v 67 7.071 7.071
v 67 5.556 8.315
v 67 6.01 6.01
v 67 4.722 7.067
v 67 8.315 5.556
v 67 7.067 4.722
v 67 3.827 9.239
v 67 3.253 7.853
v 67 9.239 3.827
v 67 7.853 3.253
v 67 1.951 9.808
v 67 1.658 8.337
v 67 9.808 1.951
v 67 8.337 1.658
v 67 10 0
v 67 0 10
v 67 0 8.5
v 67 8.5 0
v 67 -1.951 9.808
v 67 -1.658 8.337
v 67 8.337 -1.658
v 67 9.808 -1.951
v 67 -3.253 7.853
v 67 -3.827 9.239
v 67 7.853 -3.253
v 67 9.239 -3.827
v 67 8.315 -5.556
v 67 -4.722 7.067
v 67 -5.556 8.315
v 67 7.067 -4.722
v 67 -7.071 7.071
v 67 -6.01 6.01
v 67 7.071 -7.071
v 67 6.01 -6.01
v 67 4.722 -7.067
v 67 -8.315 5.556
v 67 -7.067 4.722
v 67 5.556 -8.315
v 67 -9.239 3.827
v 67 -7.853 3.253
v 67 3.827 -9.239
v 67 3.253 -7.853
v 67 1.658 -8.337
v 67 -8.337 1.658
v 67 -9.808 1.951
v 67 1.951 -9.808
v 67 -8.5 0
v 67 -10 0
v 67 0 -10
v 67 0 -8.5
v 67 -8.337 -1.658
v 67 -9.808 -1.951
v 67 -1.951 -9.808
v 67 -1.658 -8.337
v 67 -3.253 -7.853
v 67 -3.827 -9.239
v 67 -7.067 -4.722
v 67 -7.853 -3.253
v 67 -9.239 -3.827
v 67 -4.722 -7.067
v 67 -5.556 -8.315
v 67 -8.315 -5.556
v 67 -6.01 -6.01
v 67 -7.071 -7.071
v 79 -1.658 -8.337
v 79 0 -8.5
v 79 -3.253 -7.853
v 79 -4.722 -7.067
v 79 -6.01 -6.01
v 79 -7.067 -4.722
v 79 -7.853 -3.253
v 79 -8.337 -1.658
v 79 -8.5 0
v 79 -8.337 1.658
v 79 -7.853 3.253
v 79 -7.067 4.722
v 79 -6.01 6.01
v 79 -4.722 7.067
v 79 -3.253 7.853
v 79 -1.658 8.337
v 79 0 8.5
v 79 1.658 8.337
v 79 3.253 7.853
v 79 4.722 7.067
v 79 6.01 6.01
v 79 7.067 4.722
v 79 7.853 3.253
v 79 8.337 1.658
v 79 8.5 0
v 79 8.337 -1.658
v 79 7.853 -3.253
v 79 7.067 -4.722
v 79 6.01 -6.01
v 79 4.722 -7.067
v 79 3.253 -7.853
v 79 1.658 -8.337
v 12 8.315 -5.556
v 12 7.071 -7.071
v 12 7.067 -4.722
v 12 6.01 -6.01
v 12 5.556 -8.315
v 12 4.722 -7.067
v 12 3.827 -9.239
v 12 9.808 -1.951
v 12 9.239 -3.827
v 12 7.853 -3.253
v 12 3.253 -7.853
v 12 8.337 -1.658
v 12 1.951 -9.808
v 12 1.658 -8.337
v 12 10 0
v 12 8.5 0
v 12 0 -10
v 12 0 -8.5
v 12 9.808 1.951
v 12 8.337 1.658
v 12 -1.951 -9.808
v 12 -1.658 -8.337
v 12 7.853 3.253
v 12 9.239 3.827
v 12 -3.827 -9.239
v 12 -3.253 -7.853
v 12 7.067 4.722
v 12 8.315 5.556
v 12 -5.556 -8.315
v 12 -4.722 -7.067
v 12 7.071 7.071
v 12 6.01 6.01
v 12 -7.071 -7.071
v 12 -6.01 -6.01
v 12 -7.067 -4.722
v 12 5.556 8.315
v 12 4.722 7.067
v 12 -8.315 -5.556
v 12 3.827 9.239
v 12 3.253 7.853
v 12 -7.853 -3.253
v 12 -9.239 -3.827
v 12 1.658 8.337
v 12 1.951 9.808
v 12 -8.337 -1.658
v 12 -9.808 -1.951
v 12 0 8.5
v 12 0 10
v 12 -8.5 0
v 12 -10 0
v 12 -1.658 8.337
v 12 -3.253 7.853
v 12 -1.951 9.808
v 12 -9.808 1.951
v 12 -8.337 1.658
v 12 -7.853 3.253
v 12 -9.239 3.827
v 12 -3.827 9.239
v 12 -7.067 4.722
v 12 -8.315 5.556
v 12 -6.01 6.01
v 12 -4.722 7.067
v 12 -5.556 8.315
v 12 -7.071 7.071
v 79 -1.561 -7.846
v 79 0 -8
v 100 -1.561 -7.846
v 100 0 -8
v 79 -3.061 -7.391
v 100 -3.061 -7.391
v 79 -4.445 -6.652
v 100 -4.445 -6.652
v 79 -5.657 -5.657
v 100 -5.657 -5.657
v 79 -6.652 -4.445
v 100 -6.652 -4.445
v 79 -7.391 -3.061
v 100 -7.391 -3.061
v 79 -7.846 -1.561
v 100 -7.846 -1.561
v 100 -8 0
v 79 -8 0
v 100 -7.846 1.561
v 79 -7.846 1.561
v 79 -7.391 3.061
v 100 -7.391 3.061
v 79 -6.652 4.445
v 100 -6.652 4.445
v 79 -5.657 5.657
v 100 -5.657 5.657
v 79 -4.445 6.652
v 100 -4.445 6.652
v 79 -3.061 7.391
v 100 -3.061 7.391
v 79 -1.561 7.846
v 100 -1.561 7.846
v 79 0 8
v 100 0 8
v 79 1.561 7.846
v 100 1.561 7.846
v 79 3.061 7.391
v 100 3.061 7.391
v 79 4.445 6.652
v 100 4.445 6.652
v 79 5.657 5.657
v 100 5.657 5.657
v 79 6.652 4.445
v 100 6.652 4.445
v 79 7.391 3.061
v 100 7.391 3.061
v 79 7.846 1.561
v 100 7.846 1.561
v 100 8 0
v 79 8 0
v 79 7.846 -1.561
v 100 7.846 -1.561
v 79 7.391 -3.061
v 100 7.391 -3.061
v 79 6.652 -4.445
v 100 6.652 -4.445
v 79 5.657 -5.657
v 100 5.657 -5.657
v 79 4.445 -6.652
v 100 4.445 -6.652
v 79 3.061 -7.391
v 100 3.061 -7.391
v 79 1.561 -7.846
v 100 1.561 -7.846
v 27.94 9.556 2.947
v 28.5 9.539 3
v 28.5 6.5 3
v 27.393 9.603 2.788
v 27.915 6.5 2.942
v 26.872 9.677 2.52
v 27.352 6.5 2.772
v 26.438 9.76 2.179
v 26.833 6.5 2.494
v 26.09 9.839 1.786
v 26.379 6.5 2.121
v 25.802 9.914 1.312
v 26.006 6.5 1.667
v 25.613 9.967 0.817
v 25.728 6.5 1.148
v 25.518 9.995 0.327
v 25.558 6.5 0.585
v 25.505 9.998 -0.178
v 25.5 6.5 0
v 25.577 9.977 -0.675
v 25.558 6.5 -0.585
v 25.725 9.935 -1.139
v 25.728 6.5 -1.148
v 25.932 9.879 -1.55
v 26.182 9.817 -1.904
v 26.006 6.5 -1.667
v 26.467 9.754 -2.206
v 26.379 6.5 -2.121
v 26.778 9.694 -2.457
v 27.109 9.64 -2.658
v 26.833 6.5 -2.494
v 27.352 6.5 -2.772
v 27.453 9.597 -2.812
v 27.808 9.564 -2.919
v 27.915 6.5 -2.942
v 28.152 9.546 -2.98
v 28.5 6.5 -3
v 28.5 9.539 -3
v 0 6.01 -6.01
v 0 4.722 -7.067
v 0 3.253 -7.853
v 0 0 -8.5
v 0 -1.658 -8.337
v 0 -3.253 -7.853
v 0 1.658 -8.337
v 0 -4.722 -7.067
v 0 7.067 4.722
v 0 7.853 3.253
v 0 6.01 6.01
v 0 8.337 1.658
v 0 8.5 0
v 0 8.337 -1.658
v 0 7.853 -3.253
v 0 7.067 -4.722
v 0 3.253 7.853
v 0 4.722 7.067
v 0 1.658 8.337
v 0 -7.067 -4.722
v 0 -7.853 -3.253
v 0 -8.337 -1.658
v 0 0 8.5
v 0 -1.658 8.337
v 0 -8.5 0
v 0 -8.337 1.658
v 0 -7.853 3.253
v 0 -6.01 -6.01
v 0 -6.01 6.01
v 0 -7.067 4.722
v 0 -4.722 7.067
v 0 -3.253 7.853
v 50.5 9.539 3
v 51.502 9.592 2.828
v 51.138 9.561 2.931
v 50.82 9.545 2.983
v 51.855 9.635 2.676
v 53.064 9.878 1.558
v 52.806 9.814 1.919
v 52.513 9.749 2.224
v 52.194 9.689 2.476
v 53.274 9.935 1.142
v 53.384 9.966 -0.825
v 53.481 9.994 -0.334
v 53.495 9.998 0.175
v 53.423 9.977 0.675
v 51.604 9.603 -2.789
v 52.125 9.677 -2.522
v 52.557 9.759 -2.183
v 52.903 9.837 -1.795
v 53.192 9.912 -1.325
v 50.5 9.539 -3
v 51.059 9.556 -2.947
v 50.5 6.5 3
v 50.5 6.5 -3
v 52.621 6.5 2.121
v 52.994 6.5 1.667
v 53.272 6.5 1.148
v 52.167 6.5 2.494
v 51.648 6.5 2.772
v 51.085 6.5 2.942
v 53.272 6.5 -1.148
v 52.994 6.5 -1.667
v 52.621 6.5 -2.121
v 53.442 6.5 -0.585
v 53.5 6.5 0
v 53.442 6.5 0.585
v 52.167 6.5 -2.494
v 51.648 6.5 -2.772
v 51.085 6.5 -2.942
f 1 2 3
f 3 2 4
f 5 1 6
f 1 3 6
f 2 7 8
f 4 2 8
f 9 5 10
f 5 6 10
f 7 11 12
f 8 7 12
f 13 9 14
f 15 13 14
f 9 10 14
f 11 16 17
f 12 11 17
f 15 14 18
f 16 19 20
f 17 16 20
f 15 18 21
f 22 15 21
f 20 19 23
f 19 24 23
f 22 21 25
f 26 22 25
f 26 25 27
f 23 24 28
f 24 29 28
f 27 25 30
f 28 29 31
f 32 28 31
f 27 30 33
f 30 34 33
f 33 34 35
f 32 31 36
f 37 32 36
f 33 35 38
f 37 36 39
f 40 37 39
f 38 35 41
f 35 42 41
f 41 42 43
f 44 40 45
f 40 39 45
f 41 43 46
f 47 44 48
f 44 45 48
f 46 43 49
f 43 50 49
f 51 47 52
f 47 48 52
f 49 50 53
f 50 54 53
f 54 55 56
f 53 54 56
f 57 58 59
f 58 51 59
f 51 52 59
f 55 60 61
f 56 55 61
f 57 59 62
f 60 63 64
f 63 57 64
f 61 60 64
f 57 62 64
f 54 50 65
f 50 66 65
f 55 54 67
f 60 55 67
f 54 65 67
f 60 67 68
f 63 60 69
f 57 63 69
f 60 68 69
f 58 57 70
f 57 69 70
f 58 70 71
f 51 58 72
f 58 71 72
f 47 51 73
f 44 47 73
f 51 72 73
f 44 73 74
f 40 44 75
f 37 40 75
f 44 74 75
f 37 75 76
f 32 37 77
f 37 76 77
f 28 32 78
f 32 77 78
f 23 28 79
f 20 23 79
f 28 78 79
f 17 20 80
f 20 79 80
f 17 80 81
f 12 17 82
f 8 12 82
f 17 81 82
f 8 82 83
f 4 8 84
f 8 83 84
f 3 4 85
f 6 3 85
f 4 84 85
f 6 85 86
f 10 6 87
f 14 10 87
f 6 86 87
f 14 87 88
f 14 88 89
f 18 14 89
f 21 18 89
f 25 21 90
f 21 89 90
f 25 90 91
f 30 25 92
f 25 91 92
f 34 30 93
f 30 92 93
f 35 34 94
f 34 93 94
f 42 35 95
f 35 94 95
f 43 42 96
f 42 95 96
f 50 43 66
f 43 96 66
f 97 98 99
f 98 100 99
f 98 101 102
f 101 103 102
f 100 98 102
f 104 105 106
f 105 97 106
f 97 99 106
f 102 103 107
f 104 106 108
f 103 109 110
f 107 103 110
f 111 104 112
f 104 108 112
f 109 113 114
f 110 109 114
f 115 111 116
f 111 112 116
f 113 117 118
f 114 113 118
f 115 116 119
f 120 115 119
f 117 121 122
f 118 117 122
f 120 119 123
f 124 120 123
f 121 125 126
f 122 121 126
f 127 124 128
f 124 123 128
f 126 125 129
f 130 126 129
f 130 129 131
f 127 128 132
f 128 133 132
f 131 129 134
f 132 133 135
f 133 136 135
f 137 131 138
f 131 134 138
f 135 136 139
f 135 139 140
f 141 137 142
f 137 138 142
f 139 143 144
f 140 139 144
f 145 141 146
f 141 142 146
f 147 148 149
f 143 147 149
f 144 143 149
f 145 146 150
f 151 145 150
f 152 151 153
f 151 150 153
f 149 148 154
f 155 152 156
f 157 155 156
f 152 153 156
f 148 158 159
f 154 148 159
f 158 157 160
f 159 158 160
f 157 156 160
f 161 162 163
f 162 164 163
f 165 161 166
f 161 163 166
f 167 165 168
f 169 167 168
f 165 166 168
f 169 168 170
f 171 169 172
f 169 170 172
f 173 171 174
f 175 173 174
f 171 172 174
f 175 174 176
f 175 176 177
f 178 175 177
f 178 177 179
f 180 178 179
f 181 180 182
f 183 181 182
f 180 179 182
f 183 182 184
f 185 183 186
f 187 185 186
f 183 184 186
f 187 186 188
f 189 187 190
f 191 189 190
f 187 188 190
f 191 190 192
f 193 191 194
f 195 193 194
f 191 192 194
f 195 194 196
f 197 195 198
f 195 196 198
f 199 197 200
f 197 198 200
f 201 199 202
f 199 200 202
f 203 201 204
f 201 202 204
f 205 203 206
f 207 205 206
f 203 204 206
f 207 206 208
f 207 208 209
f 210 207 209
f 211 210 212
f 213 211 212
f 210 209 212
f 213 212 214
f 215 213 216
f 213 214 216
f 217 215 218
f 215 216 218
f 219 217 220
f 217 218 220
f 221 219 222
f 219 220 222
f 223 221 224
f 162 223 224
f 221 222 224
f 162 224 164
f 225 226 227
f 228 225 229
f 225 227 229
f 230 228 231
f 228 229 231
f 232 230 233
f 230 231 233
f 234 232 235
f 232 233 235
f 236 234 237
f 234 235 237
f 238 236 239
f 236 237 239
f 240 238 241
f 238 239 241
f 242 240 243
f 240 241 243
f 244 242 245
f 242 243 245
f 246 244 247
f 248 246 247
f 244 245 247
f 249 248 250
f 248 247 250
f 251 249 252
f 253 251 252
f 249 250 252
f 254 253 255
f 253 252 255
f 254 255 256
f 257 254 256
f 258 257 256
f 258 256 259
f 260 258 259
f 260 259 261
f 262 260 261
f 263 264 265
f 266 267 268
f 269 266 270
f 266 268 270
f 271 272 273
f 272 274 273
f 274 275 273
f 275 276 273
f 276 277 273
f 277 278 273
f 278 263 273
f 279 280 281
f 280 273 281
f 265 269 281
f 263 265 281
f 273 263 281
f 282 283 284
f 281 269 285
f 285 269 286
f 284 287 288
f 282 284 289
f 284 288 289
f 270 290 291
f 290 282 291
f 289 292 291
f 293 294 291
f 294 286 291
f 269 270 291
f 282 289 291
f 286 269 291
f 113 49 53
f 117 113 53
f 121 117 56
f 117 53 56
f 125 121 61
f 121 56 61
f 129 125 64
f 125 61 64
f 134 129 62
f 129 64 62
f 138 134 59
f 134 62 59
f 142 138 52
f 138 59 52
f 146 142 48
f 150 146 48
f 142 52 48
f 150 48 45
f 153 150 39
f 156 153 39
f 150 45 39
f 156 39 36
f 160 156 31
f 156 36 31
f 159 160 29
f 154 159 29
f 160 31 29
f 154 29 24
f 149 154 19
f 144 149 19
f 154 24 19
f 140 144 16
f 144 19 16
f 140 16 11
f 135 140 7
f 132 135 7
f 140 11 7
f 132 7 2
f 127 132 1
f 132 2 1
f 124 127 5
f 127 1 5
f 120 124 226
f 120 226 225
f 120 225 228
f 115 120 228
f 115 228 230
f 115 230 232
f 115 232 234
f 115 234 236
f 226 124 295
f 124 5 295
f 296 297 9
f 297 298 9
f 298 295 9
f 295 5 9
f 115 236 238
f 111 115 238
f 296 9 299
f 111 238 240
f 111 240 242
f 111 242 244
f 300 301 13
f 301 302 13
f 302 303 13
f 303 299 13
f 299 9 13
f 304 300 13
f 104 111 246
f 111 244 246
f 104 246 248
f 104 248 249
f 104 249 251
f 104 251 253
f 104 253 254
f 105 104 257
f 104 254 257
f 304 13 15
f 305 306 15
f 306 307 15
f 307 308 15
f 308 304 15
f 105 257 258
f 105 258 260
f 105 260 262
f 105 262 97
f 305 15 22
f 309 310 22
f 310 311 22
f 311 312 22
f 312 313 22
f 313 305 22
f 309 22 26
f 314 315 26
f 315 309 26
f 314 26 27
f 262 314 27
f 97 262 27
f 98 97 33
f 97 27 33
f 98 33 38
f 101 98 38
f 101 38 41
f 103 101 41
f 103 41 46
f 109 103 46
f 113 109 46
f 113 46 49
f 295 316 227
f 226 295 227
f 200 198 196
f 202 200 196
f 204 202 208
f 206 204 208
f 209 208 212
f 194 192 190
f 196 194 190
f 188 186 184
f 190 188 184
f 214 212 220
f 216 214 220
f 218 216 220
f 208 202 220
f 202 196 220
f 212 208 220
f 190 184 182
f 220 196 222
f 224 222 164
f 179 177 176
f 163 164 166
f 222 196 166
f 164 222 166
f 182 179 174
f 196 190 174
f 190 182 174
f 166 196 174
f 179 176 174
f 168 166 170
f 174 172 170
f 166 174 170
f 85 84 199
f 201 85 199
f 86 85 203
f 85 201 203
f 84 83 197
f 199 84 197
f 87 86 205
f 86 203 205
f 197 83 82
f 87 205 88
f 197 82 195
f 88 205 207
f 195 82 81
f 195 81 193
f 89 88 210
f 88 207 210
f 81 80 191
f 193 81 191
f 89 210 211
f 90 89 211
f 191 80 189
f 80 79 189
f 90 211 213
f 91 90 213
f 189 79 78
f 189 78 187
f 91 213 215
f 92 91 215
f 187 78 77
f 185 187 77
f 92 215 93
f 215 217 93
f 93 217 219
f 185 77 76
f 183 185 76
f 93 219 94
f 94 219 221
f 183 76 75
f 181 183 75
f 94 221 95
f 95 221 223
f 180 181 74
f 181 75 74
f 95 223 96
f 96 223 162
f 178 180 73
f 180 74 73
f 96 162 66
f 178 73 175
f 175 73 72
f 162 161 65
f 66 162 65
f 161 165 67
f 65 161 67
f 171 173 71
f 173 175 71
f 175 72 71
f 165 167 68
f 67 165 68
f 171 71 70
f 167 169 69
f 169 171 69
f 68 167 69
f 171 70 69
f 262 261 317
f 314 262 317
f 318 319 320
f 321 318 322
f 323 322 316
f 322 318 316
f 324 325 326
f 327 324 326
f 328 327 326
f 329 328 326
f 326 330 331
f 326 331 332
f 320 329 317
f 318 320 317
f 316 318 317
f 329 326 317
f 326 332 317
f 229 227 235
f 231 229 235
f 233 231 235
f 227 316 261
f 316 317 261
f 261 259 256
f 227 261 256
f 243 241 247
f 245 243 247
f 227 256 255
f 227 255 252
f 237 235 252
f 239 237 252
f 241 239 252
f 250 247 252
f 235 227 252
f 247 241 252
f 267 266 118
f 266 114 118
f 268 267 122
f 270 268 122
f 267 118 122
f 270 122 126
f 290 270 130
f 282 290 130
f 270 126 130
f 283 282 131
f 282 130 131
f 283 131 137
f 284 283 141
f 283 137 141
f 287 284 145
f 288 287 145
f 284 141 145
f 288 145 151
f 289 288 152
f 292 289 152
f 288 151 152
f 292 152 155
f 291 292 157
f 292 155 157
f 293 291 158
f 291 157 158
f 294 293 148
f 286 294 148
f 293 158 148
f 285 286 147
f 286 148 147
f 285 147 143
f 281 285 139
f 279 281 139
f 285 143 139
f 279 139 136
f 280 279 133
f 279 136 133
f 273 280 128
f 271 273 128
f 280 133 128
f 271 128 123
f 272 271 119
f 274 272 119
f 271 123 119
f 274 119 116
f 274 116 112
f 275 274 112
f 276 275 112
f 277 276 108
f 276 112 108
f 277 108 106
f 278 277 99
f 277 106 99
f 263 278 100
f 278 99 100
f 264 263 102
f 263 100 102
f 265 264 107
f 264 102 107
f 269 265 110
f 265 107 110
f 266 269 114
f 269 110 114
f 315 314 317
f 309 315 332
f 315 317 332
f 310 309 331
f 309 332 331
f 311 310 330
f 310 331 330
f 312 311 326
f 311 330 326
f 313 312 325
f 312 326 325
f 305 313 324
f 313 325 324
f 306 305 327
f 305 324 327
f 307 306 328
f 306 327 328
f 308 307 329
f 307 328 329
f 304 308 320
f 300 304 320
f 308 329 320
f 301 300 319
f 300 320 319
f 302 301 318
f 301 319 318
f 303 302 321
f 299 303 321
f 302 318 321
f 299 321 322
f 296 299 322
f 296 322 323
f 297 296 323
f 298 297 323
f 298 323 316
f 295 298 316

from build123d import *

# Parameters (mm, degrees)
CUT_EXTRUDE_START   = 6.5
CUT_EXTRUDE_1_DEPTH = 95.495049384


with BuildPart() as part:
    # Эскиз1 → Повернуть1 (revolve)
    with BuildSketch(Plane.XY, mode=Mode.PRIVATE) as revolve_1_sk:
        Polygon((0, 0), (0, 8.5), (12, 8.5), (12, 10), (67, 10), (67, 8.5), (79, 8.5), (79, 8), (100, 8), (100, 0), align=None)
    revolve(revolve_1_sk.sketch.rotate(Axis((100, 0, 0), (-1, 0, 0)), 90), axis=Axis((100, 0, 0), (-1, 0, 0)))

    # Эскиз2 → Вырез-Вытянуть1 (cut, through all)
    with BuildSketch(Plane(origin=(0, 0, 0), x_dir=(1, 0, 0), z_dir=(0, 1, 0)).offset(CUT_EXTRUDE_START)):
        with BuildLine():
            Line((28.5, 3), (50.5, 3))
            ThreePointArc((50.5, 3), (53.5, 0), (50.5, -3))
            Line((50.5, -3), (28.5, -3))
            ThreePointArc((28.5, -3), (25.5, 0), (28.5, 3))
        make_face()
    extrude(amount=CUT_EXTRUDE_1_DEPTH, mode=Mode.SUBTRACT)


solid = part.part
